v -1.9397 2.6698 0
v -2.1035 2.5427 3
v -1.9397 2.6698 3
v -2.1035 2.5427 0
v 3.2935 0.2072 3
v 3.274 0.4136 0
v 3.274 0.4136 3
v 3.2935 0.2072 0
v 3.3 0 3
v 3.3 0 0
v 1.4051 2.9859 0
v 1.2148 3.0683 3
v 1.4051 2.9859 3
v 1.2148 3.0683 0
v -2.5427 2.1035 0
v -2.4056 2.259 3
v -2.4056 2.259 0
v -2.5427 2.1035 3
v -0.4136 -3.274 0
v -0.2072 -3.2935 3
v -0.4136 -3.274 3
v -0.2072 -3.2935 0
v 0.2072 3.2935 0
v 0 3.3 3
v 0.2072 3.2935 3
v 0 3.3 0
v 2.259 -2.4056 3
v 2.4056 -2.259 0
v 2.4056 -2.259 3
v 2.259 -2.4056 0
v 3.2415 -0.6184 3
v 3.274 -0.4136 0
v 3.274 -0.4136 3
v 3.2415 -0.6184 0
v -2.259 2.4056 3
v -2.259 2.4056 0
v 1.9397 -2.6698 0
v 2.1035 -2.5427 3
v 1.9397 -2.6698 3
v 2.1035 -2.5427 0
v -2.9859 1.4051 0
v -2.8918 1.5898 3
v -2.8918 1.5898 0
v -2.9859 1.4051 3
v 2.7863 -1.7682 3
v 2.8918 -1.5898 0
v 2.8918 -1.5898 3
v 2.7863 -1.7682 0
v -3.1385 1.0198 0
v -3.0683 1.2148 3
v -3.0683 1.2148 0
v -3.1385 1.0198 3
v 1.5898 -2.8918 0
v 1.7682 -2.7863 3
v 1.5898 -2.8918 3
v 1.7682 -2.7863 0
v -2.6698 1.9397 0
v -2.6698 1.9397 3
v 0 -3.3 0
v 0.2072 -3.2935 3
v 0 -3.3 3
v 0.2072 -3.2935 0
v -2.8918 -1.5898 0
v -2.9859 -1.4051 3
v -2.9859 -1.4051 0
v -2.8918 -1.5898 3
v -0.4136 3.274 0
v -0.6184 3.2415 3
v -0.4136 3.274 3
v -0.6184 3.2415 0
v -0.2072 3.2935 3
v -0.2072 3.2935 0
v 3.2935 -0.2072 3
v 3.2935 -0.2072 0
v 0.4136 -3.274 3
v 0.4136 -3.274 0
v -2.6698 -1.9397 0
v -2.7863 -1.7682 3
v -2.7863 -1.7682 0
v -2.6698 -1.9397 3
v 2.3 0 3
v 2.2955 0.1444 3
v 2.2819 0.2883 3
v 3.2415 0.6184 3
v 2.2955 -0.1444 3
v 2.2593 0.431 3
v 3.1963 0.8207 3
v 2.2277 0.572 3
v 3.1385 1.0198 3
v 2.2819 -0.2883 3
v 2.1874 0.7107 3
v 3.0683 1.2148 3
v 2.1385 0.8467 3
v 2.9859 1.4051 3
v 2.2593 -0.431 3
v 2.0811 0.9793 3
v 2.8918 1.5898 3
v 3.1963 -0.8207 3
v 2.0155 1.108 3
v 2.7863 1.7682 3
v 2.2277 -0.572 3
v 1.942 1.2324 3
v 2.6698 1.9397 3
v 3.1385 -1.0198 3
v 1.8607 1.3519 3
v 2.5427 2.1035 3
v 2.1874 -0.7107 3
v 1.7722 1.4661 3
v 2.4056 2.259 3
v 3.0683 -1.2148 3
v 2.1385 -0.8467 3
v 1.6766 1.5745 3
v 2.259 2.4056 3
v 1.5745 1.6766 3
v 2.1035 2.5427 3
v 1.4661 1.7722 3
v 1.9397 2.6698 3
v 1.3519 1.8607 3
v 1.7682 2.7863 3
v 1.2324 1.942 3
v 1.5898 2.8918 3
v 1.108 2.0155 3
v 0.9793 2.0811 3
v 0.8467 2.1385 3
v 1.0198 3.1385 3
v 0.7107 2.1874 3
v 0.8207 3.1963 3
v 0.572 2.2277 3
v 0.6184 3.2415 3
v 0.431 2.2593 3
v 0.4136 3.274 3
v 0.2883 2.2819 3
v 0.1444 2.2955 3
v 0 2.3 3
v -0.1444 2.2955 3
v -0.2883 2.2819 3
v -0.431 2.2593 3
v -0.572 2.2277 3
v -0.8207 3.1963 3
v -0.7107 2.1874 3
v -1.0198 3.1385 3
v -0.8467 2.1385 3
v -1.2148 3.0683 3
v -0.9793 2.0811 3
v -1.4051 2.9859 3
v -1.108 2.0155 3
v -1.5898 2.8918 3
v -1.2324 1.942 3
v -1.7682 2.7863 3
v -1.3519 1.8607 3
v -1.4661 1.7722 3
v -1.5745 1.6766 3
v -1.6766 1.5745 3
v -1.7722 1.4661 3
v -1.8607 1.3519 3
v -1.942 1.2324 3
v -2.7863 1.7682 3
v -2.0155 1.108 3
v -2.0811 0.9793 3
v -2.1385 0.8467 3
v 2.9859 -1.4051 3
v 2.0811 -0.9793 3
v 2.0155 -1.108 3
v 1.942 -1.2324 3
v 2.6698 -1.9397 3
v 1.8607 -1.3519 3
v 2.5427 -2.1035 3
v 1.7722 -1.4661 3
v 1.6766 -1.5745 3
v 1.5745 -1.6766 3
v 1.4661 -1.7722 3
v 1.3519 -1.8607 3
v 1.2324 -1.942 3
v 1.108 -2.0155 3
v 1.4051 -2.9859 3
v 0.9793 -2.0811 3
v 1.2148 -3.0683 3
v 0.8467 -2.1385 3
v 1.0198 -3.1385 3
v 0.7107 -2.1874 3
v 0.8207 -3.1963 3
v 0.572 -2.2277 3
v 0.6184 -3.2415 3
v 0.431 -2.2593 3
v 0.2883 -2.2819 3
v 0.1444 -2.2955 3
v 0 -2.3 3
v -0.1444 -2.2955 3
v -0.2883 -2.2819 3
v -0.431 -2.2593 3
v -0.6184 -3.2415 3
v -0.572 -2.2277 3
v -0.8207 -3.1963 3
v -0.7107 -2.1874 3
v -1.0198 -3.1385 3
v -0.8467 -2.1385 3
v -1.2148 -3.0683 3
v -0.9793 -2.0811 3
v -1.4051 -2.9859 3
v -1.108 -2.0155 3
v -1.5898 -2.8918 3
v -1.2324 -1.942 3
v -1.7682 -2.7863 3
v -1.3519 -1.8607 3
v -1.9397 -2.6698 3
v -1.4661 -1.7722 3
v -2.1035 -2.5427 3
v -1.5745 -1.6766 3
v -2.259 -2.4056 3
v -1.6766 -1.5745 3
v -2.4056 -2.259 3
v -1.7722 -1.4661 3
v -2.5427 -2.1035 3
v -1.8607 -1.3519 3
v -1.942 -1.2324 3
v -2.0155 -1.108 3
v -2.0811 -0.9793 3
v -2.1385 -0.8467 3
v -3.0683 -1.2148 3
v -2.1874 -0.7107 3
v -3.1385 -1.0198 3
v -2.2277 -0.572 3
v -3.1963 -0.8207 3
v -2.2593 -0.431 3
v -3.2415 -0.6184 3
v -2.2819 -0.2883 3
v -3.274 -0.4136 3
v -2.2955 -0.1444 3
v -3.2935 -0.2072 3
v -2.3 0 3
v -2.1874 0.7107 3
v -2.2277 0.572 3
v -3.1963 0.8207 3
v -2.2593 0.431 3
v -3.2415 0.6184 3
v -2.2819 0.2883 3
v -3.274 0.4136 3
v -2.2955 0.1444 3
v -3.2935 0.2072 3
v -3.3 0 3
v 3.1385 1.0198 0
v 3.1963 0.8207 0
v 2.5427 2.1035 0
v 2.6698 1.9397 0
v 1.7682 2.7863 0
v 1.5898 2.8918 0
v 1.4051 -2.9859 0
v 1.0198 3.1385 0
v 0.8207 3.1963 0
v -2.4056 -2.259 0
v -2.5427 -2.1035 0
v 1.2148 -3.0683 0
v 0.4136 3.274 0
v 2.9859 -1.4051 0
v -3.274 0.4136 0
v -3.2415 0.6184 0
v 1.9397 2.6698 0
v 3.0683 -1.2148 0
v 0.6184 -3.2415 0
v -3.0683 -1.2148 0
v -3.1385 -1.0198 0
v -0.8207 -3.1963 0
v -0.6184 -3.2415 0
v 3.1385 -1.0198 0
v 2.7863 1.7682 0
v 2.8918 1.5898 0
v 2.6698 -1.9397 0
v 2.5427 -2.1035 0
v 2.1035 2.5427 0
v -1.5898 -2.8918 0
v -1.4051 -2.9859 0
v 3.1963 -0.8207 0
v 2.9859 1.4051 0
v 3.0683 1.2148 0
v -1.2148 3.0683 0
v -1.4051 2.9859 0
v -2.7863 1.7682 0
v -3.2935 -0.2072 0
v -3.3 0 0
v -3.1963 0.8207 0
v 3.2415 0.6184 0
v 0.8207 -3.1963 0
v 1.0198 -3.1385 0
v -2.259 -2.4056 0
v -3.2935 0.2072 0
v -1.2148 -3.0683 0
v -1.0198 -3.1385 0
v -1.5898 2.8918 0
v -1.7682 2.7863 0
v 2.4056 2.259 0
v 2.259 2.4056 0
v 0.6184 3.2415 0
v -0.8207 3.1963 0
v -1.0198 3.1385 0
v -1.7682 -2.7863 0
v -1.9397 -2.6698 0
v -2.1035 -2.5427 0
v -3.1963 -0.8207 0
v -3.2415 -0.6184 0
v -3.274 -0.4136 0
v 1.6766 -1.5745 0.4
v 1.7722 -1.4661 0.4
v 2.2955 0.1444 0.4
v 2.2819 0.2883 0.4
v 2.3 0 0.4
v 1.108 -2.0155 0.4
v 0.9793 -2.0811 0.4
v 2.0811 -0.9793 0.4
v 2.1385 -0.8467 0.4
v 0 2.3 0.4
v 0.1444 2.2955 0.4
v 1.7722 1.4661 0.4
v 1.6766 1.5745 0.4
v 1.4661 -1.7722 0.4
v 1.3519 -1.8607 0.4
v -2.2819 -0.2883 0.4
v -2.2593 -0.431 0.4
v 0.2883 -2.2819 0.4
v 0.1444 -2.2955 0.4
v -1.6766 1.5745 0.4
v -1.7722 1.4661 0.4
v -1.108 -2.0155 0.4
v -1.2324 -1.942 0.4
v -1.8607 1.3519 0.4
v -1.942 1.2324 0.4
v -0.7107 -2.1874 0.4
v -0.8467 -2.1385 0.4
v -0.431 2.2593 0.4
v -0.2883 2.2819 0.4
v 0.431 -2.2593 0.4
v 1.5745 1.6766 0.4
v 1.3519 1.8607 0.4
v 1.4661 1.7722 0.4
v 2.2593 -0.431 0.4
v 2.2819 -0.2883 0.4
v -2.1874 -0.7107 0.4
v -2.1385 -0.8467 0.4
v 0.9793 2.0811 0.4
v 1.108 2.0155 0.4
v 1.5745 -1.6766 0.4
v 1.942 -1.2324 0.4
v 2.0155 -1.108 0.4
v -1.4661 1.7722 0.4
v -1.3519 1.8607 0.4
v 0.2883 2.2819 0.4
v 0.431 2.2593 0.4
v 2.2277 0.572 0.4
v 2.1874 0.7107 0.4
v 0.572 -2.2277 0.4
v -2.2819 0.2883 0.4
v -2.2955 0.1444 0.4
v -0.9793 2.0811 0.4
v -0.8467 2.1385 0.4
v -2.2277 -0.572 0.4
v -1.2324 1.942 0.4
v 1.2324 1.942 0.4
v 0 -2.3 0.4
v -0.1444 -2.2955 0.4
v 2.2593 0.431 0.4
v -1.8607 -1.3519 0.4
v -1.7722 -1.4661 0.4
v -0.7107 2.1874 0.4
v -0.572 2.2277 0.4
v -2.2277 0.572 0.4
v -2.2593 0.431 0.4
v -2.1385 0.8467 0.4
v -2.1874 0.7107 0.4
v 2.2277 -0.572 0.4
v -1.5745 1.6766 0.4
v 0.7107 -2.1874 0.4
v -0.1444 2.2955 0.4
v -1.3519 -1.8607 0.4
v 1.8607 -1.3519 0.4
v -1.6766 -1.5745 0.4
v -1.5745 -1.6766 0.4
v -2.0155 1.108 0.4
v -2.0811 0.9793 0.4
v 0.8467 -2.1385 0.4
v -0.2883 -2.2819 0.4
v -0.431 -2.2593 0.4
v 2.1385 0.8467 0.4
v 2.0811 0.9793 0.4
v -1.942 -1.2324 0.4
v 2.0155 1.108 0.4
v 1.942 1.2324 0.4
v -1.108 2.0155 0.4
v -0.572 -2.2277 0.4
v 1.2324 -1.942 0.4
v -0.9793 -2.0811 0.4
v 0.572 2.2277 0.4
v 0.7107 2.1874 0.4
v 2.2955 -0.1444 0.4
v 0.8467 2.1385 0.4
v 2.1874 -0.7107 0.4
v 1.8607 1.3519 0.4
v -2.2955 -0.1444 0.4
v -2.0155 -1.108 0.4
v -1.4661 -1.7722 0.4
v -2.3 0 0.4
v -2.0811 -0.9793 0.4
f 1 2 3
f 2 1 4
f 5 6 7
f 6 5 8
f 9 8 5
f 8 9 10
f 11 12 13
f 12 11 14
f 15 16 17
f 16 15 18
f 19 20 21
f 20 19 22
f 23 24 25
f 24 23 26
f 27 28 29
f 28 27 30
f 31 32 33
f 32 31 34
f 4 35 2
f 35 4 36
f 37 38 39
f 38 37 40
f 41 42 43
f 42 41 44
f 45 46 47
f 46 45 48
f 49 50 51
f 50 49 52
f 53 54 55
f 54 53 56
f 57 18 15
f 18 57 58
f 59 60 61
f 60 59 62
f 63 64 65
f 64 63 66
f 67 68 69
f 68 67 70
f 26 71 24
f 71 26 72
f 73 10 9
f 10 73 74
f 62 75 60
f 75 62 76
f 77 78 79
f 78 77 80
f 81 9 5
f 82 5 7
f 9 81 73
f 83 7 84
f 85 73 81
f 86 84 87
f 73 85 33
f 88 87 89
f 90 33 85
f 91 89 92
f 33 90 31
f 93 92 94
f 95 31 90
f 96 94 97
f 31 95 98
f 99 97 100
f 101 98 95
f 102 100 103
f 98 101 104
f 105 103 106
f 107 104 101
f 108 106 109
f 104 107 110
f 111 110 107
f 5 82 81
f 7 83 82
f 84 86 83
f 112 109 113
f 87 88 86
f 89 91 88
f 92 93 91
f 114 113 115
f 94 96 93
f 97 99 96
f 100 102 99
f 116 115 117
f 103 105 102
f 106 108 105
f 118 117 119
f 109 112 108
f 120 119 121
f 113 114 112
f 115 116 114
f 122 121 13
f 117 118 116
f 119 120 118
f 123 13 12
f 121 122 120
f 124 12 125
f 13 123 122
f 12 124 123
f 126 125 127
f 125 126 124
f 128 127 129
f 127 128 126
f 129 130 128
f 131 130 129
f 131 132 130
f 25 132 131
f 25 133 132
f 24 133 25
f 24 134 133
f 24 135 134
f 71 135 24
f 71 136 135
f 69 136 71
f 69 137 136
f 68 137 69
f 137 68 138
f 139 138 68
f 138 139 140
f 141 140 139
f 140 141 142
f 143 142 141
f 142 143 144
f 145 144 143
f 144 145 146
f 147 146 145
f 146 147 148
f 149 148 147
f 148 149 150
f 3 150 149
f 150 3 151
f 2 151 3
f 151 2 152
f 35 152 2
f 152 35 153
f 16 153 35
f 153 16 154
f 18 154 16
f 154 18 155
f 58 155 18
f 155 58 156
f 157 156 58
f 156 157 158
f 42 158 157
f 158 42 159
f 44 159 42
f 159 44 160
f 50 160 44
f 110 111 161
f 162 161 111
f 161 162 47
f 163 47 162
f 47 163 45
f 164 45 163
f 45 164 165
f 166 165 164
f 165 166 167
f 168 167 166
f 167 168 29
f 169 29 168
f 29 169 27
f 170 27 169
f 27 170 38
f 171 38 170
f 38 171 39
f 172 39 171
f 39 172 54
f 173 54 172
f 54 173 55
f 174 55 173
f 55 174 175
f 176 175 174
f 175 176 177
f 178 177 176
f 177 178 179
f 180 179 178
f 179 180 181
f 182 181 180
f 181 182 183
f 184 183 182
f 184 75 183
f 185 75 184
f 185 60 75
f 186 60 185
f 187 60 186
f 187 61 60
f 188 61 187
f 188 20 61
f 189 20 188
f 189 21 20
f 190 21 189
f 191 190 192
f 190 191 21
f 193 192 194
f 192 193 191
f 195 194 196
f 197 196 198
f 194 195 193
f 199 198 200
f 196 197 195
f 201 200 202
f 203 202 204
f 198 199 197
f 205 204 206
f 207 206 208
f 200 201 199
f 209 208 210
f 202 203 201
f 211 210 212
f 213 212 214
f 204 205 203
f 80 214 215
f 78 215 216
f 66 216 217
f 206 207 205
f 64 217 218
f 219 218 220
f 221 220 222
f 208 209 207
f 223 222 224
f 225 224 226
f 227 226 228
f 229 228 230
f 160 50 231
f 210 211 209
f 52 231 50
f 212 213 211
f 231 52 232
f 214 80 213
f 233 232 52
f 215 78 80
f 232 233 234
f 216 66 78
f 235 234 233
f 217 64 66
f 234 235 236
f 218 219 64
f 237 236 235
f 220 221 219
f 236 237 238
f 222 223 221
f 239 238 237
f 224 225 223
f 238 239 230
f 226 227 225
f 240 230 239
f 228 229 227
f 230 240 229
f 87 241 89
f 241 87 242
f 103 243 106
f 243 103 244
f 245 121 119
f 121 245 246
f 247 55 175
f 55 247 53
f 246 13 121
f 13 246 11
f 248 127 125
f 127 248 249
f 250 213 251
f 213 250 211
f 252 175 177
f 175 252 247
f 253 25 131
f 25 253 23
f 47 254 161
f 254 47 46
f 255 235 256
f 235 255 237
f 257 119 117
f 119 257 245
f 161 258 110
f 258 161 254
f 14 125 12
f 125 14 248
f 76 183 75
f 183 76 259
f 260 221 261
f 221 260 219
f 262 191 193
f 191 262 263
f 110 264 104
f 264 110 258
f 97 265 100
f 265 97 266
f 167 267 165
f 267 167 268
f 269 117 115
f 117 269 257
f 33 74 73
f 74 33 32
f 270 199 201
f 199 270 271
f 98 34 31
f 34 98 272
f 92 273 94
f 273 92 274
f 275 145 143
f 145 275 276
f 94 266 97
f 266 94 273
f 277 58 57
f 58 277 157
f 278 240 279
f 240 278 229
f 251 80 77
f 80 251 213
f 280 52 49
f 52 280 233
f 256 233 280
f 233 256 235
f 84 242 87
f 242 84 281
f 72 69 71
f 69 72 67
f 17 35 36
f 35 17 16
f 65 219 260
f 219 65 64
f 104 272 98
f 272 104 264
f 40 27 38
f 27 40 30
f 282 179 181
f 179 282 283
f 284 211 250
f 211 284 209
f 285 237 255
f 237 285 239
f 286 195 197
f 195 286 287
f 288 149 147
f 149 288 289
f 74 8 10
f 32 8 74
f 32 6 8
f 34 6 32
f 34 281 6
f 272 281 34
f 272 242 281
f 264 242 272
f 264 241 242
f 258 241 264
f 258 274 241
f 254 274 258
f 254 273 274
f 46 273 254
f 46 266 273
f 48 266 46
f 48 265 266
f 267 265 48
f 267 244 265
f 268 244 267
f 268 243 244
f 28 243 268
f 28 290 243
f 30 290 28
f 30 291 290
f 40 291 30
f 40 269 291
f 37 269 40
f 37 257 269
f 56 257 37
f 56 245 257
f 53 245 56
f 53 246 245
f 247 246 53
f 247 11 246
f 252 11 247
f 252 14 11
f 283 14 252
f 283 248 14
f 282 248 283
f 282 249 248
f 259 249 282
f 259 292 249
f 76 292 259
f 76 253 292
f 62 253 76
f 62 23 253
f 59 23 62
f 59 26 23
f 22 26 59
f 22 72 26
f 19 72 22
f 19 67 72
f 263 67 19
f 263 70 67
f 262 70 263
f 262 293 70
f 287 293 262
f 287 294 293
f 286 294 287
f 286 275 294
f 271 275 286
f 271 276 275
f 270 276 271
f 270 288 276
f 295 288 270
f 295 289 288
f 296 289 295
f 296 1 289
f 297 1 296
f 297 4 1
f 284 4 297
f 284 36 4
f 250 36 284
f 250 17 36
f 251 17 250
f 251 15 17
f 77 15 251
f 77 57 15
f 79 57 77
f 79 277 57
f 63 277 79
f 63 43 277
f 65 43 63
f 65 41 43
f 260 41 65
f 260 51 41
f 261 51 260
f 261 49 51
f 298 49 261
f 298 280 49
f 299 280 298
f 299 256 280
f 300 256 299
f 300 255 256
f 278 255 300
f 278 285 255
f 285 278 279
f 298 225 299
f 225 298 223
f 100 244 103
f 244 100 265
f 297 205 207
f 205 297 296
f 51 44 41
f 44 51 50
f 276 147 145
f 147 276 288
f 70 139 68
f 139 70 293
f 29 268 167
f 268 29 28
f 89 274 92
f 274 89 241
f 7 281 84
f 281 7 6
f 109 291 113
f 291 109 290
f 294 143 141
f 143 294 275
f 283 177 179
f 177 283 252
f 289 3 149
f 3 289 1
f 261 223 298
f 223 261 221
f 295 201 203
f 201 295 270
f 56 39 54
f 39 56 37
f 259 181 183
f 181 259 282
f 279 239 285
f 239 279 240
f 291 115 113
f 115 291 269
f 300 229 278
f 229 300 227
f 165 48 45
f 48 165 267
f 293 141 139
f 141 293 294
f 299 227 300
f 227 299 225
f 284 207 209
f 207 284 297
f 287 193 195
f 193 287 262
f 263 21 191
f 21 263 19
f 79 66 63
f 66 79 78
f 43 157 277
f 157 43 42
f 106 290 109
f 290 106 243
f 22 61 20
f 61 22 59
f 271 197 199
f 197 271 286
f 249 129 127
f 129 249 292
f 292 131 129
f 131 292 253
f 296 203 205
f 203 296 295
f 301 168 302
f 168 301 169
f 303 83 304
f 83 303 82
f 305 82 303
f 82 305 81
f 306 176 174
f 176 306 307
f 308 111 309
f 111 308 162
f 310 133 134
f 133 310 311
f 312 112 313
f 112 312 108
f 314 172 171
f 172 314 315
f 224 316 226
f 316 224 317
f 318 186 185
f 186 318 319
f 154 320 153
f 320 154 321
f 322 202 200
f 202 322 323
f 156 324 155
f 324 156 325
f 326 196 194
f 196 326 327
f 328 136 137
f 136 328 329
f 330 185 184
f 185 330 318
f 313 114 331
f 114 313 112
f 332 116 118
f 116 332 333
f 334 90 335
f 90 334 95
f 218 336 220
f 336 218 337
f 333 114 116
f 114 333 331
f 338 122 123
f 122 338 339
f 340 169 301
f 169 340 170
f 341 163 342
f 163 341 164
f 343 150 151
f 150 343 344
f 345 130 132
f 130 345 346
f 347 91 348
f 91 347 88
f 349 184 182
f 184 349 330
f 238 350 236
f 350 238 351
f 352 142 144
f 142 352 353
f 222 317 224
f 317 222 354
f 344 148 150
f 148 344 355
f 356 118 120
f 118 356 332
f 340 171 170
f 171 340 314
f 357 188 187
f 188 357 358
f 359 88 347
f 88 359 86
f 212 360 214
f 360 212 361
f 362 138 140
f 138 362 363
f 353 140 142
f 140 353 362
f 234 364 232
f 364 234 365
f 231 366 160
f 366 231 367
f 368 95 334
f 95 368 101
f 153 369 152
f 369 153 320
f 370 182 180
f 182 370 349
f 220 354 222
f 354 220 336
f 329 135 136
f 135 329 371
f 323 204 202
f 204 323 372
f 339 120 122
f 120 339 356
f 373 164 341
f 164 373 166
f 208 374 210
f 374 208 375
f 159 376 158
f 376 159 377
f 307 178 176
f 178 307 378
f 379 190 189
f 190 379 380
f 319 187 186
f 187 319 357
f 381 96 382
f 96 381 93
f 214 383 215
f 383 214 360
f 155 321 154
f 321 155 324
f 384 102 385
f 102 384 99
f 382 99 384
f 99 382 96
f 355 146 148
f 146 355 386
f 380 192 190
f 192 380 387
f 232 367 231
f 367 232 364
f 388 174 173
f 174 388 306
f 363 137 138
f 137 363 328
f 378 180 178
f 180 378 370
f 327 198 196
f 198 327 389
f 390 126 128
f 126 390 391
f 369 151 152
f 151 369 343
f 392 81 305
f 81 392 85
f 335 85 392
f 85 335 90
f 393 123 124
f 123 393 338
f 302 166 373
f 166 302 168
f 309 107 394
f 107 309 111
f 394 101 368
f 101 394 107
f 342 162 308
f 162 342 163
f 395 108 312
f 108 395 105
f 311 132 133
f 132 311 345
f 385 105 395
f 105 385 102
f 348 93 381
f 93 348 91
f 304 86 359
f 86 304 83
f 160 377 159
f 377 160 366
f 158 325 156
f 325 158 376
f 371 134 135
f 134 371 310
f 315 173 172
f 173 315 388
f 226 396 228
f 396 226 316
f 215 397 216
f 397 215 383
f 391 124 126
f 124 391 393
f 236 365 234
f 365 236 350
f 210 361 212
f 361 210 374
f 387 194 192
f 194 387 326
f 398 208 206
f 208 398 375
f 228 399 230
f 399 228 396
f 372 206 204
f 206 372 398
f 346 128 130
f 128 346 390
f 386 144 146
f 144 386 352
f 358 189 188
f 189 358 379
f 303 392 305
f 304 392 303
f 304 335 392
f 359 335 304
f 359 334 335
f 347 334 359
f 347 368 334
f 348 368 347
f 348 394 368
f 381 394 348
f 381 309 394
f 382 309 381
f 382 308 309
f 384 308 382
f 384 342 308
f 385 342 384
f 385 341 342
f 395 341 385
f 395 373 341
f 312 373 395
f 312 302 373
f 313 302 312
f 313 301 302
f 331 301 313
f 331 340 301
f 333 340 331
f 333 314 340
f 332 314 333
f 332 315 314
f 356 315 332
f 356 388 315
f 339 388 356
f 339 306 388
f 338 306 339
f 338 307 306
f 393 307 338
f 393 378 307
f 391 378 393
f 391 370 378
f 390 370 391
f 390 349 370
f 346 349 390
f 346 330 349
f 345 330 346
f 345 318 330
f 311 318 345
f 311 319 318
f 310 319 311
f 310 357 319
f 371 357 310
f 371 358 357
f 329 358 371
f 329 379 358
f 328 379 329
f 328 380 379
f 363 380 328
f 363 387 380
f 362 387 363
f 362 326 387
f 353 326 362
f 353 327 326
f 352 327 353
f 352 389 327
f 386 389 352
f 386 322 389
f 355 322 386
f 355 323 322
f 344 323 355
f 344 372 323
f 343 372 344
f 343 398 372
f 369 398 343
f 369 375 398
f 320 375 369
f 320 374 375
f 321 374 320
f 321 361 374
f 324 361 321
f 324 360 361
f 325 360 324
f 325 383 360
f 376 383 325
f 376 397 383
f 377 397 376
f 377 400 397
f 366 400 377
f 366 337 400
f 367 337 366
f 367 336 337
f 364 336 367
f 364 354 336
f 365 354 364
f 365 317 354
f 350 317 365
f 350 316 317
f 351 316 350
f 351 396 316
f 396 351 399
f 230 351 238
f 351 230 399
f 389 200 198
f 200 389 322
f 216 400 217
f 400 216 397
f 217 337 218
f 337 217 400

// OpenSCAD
pared = 2;

placaX = 76;
placaY = 50;

marcoX = placaX + 1;
marcoY = placaY + 1; 

radio = 5;

module carcasa() {
    rotate([90,60,90]){
        difference() {
            union () {
                minkowski() {
                    rotate_extrude(angle=60, $fn= 100) {
                        square([marcoY, marcoX], center = false);
                    }
                    sphere(radio, $fn= 100);
                }                
            }
            rotate_extrude(angle=60, $fn= 100) {
                square([marcoY, marcoX], center = false);
            }
        }
    } 
    minkowski() {
        cube([marcoX, marcoY, 10], center = false);
        cylinder(r = radio, $fn= 100);
    }
    
}

module caja(){
    difference(){
        union() {
            difference() {
                carcasa();
                // Recortamos el hueco del marco
                cube([marcoX, marcoY, 20], center = false);
            }            
            translate([-0.5,0.5,-2 + 0.001]) cube([marcoX + 1, marcoY + 1, 2], center = false);
            // Tapon - exterior
            translate([marcoX - 10,37,-45]) rotate([30,0,0]) cylinder(r = 8, h = 10, $fn = 100);
            // Roscas - exterior
            translate([4.5, 4.5, -4]) cylinder(r = 2.25, h = 6, center = false, $fn = 100);      
            translate([4.5, placaY - 4.5, -4]) cylinder(r = 2.25, h = 6, center = false, $fn = 100);    
            translate([placaX - 4.5, 4.5, -4]) cylinder(r = 2.25, h = 6, center = false, $fn = 100);      
            translate([placaX - 4.5,placaY - 4.5, -4]) cylinder(r = 2.25, h = 6, center = false, $fn = 100);                         
        }
        // Recorte del marco
        translate([0,10,-2 ]) cube([marcoX - 10, marcoY - 20, 2 + 0.002], center = false);
        // Tapon - interior
        translate([marcoX - 10,37,-45 - 0.001]) rotate([30,0,0]) cylinder(r = 6, h = 10 + 0.002, $fn = 100);   
        // Roscas - interior
        translate([4.5, 4.5, -5]) cylinder(r = 1.25, h = 8, center = false, $fn = 100);      
        translate([4.5,placaY - 4.5,-5]) cylinder(r = 1.25, h = 8, center = false, $fn = 100);    
        translate([placaX - 4.5,4.5,-5]) cylinder(r = 1.25, h = 8, center = false, $fn = 100);      
        translate([placaX - 4.5,placaY - 4.5,-5]) cylinder(r = 1.25, h = 8, center = false, $fn = 100);      
    }    
}

module tapon_cable(){
    difference(){
        union(){
            cylinder(r = 6, h = 10 + 2, center = false, $fn = 100);
            cylinder(r = 8, h = 2, center = false, $fn = 100);  
            translate([0,0,10 + 2]) cylinder(r1 = 6 + 0.2, r2 = 4 , h = 4, center = false, $fn = 100);               
        }   
        translate([0,0,-0.001]) cylinder(d= 4.2, h = 20, center = false, $fn = 100);
        cube([40,0.2,40], center = true);
    }
}

module tapa() {  
    union() {  
        intersection() {        
            difference() {
                translate ([2,2,0]) minkowski(){
                    cube([placaX - 4, placaY + 1 - 4, 8], center = false); 
                    cylinder(r = 2, h = 0.001, center = false, $fn = 100);
                }
                translate ([3,3,2]) minkowski(){
                    cube([placaX - 4 - 2, placaY + 1 - 4 - 2, 8], center = false); 
                    cylinder(r = 2, h = 0.001, center = false, $fn = 100);
                }
            } 
            cube([placaX, placaY + 1, 8], center = false); 
        }
         minkowski() {
            cube([marcoX, marcoY, 0.8], center = false);
            cylinder(r = radio, h = 0.001, $fn= 100);
        }
    }
}

module tapa_display() {
    difference() {
        translate([0,placaY,2 + 0.001]) rotate([180,0,0]) translate([0,0,0]) tapa();
        translate([8 - 0.5,placaY - 8 - 15 - 1,0]) cube([62,16,2 + 0.002], center = false);
    }
}

module boton_exterior() {
    cylinder(r = 3, h = 2 + 0.002, center = false, $fn = 100); 
    translate([-2,0,0]) cube([4, 10 + 3, 2 + 0.002], center = false);  
}

module boton_interior(caption = "") {
    cylinder(r = 3 - 0.5, h = 1, center = false, $fn = 100); 
    translate([-(4 - 1)/2,0,0]) cube([4 - 1, 10 + 3, 1], center = false); 
    translate([0,0,-3]) cylinder(r = 2, h = 3, center = false, $fn = 100); 
}

module tapa_display_con_botones() {
    difference() {
        tapa_display();
        for(i=[12.5:7.5:+12.5 + 52.5]) 
            translate([i,5,0]) boton_exterior();
    }
    for(i=[12.5:7.5:+12.5 + 52.5]) 
            translate([i,5 + 0.001, 1]) boton_interior();
}

module tapa_display_con_botones_y_tornillos() {
    difference() {
        union() {
            tapa_display_con_botones();
            translate([4.5,4.5 - 1,-6]) cylinder(r = 4, h = 8, center = false, $fn = 100);      
            translate([4.5,placaY - 4.5,-6]) cylinder(r = 4, h = 8, center = false, $fn = 100);    
            translate([placaX - 4.5,4.5 - 1,-6]) cylinder(r = 4, h = 8, center = false, $fn = 100);      
            translate([placaX - 4.5,placaY - 4.5,-6]) cylinder(r = 4, h = 8, center = false, $fn = 100);  
        }

        translate([4.5,4.5 - 1,-4]) cylinder(r = 3.5, h = 8, center = false, $fn = 100);      
        translate([4.5,placaY - 4.5,-4]) cylinder(r = 3.5, h = 8, center = false, $fn = 100);    
        translate([placaX - 4.5,4.5 - 1,-4]) cylinder(r = 3.5, h = 8, center = false, $fn = 100);      
        translate([placaX - 4.5,placaY - 4.5,-4]) cylinder(r = 3.5, h = 8, center = false, $fn = 100);  

        translate([4.5,4.5 - 1,-7]) cylinder(r = 2, h = 8, center = false, $fn = 100);      
        translate([4.5,placaY - 4.5,-7]) cylinder(r = 2, h = 8, center = false, $fn = 100);    
        translate([placaX - 4.5,4.5 - 1,-7]) cylinder(r = 2, h = 8, center = false, $fn = 100);      
        translate([placaX - 4.5,placaY - 4.5,-7]) cylinder(r = 2, h = 8, center = false, $fn = 100);  
    }
}

module tamponcillos(){
    difference(){
        cylinder(r = 3.3, h = 3, center = false, $fn = 100);
        translate([0,0,0.4]) cylinder(r = 2.3, h = 3, center = false, $fn = 100);
    }
}

// caja();
// carcasa();
// tapa_display_con_botones_y_tornillos();
// tapa();
// tapon_cable();
tamponcillos();
